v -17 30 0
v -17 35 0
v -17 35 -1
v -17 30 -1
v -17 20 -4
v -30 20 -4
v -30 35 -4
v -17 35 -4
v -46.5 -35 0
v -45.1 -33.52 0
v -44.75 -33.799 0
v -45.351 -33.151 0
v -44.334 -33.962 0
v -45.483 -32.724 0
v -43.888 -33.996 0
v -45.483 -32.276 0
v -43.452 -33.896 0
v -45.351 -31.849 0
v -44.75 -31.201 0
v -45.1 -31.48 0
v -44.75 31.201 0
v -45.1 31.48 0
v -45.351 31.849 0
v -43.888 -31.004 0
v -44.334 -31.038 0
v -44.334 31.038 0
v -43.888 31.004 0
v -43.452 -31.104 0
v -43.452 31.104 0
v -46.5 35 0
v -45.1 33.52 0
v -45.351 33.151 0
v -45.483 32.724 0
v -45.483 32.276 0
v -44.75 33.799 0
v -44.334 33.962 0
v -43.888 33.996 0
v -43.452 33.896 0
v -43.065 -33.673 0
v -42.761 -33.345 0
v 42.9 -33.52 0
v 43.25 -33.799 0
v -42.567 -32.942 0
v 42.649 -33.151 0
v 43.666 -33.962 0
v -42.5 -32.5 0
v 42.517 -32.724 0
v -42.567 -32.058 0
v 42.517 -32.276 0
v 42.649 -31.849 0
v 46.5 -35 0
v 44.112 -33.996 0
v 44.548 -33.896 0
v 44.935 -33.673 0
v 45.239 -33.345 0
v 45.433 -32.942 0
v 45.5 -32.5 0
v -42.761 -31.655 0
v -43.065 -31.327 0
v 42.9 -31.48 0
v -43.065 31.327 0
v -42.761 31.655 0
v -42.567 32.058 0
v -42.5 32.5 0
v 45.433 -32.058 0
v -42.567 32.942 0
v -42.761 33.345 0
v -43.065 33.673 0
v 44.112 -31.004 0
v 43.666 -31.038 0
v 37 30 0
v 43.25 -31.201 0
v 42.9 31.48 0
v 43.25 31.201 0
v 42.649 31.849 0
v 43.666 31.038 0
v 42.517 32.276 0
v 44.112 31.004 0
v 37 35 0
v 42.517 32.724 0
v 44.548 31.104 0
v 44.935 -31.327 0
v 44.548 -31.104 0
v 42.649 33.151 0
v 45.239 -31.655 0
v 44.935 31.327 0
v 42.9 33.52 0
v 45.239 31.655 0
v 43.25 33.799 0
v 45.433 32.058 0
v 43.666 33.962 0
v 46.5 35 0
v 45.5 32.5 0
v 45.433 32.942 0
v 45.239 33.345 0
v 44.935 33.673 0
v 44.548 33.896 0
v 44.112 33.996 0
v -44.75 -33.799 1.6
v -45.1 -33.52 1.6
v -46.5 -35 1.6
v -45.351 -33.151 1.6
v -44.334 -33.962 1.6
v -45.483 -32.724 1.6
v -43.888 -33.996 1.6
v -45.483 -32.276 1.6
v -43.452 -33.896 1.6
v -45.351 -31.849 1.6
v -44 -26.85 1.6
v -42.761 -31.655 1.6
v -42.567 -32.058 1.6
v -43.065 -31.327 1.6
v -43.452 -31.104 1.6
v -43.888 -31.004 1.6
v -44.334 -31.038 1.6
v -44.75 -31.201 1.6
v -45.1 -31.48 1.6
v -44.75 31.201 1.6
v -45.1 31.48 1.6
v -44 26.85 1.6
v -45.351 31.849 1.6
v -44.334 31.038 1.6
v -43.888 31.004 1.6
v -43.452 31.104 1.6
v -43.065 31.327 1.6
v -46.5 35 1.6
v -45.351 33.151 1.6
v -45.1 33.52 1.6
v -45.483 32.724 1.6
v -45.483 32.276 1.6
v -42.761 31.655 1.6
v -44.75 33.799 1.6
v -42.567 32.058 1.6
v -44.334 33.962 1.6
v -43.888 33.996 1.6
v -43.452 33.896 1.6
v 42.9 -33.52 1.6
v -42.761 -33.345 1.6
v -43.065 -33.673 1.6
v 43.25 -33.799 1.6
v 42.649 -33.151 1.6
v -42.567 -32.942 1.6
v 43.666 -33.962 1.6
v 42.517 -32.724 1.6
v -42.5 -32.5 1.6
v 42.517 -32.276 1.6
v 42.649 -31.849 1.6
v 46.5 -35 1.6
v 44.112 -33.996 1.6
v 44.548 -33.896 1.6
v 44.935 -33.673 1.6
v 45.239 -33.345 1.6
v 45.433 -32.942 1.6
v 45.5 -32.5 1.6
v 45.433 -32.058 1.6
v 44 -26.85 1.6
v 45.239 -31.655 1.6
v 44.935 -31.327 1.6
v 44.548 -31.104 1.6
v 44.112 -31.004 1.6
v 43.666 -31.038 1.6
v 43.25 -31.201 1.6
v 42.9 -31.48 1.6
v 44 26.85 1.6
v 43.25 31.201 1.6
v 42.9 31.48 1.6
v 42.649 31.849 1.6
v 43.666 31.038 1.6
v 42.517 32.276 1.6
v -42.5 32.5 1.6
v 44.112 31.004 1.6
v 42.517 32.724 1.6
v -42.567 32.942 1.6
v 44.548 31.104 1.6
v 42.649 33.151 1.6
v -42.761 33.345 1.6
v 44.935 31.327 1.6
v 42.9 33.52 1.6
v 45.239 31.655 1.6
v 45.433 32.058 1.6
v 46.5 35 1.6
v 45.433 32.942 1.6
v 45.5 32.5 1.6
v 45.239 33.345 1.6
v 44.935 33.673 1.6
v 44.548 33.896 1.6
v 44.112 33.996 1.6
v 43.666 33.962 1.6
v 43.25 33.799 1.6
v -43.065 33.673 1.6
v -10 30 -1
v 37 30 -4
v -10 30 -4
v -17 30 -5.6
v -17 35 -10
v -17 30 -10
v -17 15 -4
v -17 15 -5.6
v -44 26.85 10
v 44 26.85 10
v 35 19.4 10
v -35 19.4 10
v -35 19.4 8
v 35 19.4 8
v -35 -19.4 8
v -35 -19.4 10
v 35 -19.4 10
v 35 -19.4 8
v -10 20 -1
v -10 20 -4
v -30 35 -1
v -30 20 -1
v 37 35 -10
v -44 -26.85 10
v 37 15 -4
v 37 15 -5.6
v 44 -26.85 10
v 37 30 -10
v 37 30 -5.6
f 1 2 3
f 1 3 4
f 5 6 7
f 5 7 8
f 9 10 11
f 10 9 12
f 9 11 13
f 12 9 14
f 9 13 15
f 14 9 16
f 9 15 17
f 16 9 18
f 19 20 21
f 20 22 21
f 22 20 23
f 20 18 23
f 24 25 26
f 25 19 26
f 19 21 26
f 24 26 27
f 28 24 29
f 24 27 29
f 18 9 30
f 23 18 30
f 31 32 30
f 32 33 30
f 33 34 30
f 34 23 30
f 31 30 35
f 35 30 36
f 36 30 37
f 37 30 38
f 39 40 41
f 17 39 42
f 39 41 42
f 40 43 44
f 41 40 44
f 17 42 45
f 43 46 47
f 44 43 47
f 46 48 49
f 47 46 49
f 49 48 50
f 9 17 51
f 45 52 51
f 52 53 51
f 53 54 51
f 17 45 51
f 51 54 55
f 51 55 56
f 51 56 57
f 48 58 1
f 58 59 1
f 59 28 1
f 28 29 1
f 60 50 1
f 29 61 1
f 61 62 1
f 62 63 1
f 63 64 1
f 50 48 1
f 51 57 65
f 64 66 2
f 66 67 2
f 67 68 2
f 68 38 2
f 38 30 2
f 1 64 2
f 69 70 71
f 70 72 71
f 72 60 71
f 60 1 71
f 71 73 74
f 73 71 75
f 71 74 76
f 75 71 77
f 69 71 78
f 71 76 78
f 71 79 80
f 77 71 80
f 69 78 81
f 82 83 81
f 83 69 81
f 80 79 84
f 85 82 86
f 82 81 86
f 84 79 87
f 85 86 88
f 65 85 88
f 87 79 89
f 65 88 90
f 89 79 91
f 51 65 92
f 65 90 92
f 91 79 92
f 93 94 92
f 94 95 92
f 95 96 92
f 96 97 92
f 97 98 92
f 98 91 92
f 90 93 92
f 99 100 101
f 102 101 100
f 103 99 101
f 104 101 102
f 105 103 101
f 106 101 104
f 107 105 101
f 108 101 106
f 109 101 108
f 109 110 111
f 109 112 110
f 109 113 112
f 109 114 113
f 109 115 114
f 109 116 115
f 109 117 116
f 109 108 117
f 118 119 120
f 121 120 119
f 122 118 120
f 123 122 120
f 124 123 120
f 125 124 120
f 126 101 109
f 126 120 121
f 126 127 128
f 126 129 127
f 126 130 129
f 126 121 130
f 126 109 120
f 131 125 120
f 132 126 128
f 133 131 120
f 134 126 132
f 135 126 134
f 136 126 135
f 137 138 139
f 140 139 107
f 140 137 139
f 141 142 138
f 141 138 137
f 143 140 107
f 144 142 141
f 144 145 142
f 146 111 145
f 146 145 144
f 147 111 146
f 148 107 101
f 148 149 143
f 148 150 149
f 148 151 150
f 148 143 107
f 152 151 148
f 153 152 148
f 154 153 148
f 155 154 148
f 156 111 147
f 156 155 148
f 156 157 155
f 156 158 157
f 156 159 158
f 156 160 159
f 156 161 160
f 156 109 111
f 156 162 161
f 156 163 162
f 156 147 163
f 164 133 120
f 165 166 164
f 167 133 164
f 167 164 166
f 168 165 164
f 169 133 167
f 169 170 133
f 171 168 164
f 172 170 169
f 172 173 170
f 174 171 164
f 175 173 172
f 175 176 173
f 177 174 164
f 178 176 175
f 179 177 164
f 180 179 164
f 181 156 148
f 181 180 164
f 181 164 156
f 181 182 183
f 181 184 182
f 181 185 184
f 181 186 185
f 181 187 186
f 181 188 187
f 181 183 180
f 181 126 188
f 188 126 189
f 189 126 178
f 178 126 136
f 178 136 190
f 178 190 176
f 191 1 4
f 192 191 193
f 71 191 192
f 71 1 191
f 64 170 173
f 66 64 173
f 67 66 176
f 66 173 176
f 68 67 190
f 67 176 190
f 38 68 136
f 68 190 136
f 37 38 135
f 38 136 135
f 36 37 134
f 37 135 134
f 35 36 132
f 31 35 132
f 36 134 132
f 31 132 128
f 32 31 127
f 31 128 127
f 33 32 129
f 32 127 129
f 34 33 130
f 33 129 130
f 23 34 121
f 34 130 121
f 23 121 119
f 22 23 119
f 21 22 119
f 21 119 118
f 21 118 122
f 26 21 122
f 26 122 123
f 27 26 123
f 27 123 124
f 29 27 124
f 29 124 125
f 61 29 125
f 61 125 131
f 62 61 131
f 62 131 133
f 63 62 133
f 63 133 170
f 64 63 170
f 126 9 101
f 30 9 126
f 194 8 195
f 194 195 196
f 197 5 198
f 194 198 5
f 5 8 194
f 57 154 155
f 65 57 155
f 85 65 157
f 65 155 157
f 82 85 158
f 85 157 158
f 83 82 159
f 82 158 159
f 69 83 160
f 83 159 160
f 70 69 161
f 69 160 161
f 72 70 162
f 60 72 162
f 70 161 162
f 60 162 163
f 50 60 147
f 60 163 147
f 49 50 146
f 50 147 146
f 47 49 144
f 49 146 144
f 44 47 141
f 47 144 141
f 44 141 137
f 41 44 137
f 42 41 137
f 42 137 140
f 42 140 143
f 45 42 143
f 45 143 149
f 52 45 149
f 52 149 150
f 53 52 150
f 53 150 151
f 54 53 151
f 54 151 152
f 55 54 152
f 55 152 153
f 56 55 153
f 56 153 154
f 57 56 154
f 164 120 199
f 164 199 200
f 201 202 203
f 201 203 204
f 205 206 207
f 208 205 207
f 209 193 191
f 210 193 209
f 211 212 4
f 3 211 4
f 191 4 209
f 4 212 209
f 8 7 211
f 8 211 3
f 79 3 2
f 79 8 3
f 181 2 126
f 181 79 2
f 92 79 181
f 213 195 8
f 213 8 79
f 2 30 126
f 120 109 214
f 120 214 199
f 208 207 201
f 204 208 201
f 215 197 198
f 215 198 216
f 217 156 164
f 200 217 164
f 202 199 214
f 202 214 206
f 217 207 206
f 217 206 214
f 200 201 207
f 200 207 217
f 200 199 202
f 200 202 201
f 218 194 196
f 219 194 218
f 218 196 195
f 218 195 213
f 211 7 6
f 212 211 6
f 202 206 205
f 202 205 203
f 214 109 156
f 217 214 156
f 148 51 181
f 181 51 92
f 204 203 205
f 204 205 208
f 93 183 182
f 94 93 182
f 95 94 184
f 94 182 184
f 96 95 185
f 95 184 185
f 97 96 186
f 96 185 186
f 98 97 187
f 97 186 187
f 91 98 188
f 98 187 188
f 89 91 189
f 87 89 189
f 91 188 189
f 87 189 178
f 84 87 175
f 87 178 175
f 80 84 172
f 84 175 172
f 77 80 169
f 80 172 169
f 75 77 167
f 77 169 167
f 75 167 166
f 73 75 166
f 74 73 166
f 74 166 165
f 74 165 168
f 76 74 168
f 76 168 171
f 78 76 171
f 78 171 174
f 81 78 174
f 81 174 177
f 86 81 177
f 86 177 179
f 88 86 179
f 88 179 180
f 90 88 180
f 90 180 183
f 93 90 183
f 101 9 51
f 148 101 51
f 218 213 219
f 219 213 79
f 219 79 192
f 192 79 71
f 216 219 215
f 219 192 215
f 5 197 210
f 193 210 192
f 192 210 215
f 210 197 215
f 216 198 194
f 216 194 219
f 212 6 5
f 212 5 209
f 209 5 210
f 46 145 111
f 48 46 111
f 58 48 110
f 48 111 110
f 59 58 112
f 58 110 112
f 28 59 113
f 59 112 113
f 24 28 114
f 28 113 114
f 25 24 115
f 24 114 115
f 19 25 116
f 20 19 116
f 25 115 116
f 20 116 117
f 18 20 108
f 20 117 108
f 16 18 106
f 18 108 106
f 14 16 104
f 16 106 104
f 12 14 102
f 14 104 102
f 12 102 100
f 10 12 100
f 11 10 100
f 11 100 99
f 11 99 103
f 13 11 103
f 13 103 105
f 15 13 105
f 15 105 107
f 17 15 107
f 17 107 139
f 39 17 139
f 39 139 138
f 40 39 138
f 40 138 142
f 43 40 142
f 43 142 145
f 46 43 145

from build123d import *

# Parameters (mm, degrees)
SKETCH003_W     = 93
SKETCH003_H     = 70
PAD003_DEPTH    = 1.6
SKETCH_W        = 88
SKETCH_H        = 53.7
PAD_DEPTH       = 8.4
SKETCH004_W     = 70
SKETCH004_H     = 38.8
POCKET_DEPTH    = 2
SKETCH005_R     = 1.5
POCKET001_DEPTH = 1.601
SKETCH006_W     = 54
SKETCH006_H     = 5
PAD004_DEPTH    = 10
SKETCH007_W     = 54
SKETCH007_H     = 20
PAD005_DEPTH    = 1.6
SKETCH008_W     = 20
SKETCH008_H     = 15
PAD006_DEPTH    = 3


with BuildPart() as part:
    # Sketch003 → Pad003 (new body)
    with BuildSketch(Plane.XY):
        Rectangle(SKETCH003_W, SKETCH003_H)
    extrude(amount=PAD003_DEPTH)

    # Sketch (on DatumPlane) → Pad (join)
    with BuildSketch(Plane.XY.offset(1.6)):
        Rectangle(SKETCH_W, SKETCH_H)
    extrude(amount=PAD_DEPTH)

    # Sketch004 (on DatumPlane) → Pocket (cut)
    with BuildSketch(Plane.XY.offset(10)):
        Rectangle(SKETCH004_W, SKETCH004_H)
    extrude(amount=-POCKET_DEPTH, mode=Mode.SUBTRACT)

    # Sketch005 (on DatumPlane) → Pocket001 (cut, through all)
    with BuildSketch(Plane.XY.offset(1.6)):
        with Locations((-44, 32.5)):
            Circle(SKETCH005_R)
        with Locations((44, 32.5)):
            Circle(SKETCH005_R)
        with Locations((-44, -32.5)):
            Circle(SKETCH005_R)
        with Locations((44, -32.5)):
            Circle(SKETCH005_R)
    extrude(amount=-POCKET001_DEPTH, mode=Mode.SUBTRACT)

    # Sketch006 (on DatumPlane) → Pad004 (join)
    with BuildSketch(Plane(origin=(0, 0, 0), x_dir=(1, 0, 0), z_dir=(0, 0, -1))):
        with Locations((10, -32.5)):
            Rectangle(SKETCH006_W, SKETCH006_H)
    extrude(amount=PAD004_DEPTH)

    # Sketch007 (on DatumPlane) → Pad005 (join)
    with BuildSketch(Plane(origin=(0, 0, -4), x_dir=(1, 0, 0), z_dir=(0, 0, -1))):
        with Locations((10, -25)):
            Rectangle(SKETCH007_W, SKETCH007_H)
    extrude(amount=PAD005_DEPTH)

    # Sketch008 (on DatumPlane) → Pad006 (join)
    with BuildSketch(Plane(origin=(0, 0, -4), x_dir=(1, 0, 0), z_dir=(0, 0, -1))):
        with Locations((-20, -27.5)):
            Rectangle(SKETCH008_W, SKETCH008_H)
    extrude(amount=-PAD006_DEPTH)


solid = part.part
